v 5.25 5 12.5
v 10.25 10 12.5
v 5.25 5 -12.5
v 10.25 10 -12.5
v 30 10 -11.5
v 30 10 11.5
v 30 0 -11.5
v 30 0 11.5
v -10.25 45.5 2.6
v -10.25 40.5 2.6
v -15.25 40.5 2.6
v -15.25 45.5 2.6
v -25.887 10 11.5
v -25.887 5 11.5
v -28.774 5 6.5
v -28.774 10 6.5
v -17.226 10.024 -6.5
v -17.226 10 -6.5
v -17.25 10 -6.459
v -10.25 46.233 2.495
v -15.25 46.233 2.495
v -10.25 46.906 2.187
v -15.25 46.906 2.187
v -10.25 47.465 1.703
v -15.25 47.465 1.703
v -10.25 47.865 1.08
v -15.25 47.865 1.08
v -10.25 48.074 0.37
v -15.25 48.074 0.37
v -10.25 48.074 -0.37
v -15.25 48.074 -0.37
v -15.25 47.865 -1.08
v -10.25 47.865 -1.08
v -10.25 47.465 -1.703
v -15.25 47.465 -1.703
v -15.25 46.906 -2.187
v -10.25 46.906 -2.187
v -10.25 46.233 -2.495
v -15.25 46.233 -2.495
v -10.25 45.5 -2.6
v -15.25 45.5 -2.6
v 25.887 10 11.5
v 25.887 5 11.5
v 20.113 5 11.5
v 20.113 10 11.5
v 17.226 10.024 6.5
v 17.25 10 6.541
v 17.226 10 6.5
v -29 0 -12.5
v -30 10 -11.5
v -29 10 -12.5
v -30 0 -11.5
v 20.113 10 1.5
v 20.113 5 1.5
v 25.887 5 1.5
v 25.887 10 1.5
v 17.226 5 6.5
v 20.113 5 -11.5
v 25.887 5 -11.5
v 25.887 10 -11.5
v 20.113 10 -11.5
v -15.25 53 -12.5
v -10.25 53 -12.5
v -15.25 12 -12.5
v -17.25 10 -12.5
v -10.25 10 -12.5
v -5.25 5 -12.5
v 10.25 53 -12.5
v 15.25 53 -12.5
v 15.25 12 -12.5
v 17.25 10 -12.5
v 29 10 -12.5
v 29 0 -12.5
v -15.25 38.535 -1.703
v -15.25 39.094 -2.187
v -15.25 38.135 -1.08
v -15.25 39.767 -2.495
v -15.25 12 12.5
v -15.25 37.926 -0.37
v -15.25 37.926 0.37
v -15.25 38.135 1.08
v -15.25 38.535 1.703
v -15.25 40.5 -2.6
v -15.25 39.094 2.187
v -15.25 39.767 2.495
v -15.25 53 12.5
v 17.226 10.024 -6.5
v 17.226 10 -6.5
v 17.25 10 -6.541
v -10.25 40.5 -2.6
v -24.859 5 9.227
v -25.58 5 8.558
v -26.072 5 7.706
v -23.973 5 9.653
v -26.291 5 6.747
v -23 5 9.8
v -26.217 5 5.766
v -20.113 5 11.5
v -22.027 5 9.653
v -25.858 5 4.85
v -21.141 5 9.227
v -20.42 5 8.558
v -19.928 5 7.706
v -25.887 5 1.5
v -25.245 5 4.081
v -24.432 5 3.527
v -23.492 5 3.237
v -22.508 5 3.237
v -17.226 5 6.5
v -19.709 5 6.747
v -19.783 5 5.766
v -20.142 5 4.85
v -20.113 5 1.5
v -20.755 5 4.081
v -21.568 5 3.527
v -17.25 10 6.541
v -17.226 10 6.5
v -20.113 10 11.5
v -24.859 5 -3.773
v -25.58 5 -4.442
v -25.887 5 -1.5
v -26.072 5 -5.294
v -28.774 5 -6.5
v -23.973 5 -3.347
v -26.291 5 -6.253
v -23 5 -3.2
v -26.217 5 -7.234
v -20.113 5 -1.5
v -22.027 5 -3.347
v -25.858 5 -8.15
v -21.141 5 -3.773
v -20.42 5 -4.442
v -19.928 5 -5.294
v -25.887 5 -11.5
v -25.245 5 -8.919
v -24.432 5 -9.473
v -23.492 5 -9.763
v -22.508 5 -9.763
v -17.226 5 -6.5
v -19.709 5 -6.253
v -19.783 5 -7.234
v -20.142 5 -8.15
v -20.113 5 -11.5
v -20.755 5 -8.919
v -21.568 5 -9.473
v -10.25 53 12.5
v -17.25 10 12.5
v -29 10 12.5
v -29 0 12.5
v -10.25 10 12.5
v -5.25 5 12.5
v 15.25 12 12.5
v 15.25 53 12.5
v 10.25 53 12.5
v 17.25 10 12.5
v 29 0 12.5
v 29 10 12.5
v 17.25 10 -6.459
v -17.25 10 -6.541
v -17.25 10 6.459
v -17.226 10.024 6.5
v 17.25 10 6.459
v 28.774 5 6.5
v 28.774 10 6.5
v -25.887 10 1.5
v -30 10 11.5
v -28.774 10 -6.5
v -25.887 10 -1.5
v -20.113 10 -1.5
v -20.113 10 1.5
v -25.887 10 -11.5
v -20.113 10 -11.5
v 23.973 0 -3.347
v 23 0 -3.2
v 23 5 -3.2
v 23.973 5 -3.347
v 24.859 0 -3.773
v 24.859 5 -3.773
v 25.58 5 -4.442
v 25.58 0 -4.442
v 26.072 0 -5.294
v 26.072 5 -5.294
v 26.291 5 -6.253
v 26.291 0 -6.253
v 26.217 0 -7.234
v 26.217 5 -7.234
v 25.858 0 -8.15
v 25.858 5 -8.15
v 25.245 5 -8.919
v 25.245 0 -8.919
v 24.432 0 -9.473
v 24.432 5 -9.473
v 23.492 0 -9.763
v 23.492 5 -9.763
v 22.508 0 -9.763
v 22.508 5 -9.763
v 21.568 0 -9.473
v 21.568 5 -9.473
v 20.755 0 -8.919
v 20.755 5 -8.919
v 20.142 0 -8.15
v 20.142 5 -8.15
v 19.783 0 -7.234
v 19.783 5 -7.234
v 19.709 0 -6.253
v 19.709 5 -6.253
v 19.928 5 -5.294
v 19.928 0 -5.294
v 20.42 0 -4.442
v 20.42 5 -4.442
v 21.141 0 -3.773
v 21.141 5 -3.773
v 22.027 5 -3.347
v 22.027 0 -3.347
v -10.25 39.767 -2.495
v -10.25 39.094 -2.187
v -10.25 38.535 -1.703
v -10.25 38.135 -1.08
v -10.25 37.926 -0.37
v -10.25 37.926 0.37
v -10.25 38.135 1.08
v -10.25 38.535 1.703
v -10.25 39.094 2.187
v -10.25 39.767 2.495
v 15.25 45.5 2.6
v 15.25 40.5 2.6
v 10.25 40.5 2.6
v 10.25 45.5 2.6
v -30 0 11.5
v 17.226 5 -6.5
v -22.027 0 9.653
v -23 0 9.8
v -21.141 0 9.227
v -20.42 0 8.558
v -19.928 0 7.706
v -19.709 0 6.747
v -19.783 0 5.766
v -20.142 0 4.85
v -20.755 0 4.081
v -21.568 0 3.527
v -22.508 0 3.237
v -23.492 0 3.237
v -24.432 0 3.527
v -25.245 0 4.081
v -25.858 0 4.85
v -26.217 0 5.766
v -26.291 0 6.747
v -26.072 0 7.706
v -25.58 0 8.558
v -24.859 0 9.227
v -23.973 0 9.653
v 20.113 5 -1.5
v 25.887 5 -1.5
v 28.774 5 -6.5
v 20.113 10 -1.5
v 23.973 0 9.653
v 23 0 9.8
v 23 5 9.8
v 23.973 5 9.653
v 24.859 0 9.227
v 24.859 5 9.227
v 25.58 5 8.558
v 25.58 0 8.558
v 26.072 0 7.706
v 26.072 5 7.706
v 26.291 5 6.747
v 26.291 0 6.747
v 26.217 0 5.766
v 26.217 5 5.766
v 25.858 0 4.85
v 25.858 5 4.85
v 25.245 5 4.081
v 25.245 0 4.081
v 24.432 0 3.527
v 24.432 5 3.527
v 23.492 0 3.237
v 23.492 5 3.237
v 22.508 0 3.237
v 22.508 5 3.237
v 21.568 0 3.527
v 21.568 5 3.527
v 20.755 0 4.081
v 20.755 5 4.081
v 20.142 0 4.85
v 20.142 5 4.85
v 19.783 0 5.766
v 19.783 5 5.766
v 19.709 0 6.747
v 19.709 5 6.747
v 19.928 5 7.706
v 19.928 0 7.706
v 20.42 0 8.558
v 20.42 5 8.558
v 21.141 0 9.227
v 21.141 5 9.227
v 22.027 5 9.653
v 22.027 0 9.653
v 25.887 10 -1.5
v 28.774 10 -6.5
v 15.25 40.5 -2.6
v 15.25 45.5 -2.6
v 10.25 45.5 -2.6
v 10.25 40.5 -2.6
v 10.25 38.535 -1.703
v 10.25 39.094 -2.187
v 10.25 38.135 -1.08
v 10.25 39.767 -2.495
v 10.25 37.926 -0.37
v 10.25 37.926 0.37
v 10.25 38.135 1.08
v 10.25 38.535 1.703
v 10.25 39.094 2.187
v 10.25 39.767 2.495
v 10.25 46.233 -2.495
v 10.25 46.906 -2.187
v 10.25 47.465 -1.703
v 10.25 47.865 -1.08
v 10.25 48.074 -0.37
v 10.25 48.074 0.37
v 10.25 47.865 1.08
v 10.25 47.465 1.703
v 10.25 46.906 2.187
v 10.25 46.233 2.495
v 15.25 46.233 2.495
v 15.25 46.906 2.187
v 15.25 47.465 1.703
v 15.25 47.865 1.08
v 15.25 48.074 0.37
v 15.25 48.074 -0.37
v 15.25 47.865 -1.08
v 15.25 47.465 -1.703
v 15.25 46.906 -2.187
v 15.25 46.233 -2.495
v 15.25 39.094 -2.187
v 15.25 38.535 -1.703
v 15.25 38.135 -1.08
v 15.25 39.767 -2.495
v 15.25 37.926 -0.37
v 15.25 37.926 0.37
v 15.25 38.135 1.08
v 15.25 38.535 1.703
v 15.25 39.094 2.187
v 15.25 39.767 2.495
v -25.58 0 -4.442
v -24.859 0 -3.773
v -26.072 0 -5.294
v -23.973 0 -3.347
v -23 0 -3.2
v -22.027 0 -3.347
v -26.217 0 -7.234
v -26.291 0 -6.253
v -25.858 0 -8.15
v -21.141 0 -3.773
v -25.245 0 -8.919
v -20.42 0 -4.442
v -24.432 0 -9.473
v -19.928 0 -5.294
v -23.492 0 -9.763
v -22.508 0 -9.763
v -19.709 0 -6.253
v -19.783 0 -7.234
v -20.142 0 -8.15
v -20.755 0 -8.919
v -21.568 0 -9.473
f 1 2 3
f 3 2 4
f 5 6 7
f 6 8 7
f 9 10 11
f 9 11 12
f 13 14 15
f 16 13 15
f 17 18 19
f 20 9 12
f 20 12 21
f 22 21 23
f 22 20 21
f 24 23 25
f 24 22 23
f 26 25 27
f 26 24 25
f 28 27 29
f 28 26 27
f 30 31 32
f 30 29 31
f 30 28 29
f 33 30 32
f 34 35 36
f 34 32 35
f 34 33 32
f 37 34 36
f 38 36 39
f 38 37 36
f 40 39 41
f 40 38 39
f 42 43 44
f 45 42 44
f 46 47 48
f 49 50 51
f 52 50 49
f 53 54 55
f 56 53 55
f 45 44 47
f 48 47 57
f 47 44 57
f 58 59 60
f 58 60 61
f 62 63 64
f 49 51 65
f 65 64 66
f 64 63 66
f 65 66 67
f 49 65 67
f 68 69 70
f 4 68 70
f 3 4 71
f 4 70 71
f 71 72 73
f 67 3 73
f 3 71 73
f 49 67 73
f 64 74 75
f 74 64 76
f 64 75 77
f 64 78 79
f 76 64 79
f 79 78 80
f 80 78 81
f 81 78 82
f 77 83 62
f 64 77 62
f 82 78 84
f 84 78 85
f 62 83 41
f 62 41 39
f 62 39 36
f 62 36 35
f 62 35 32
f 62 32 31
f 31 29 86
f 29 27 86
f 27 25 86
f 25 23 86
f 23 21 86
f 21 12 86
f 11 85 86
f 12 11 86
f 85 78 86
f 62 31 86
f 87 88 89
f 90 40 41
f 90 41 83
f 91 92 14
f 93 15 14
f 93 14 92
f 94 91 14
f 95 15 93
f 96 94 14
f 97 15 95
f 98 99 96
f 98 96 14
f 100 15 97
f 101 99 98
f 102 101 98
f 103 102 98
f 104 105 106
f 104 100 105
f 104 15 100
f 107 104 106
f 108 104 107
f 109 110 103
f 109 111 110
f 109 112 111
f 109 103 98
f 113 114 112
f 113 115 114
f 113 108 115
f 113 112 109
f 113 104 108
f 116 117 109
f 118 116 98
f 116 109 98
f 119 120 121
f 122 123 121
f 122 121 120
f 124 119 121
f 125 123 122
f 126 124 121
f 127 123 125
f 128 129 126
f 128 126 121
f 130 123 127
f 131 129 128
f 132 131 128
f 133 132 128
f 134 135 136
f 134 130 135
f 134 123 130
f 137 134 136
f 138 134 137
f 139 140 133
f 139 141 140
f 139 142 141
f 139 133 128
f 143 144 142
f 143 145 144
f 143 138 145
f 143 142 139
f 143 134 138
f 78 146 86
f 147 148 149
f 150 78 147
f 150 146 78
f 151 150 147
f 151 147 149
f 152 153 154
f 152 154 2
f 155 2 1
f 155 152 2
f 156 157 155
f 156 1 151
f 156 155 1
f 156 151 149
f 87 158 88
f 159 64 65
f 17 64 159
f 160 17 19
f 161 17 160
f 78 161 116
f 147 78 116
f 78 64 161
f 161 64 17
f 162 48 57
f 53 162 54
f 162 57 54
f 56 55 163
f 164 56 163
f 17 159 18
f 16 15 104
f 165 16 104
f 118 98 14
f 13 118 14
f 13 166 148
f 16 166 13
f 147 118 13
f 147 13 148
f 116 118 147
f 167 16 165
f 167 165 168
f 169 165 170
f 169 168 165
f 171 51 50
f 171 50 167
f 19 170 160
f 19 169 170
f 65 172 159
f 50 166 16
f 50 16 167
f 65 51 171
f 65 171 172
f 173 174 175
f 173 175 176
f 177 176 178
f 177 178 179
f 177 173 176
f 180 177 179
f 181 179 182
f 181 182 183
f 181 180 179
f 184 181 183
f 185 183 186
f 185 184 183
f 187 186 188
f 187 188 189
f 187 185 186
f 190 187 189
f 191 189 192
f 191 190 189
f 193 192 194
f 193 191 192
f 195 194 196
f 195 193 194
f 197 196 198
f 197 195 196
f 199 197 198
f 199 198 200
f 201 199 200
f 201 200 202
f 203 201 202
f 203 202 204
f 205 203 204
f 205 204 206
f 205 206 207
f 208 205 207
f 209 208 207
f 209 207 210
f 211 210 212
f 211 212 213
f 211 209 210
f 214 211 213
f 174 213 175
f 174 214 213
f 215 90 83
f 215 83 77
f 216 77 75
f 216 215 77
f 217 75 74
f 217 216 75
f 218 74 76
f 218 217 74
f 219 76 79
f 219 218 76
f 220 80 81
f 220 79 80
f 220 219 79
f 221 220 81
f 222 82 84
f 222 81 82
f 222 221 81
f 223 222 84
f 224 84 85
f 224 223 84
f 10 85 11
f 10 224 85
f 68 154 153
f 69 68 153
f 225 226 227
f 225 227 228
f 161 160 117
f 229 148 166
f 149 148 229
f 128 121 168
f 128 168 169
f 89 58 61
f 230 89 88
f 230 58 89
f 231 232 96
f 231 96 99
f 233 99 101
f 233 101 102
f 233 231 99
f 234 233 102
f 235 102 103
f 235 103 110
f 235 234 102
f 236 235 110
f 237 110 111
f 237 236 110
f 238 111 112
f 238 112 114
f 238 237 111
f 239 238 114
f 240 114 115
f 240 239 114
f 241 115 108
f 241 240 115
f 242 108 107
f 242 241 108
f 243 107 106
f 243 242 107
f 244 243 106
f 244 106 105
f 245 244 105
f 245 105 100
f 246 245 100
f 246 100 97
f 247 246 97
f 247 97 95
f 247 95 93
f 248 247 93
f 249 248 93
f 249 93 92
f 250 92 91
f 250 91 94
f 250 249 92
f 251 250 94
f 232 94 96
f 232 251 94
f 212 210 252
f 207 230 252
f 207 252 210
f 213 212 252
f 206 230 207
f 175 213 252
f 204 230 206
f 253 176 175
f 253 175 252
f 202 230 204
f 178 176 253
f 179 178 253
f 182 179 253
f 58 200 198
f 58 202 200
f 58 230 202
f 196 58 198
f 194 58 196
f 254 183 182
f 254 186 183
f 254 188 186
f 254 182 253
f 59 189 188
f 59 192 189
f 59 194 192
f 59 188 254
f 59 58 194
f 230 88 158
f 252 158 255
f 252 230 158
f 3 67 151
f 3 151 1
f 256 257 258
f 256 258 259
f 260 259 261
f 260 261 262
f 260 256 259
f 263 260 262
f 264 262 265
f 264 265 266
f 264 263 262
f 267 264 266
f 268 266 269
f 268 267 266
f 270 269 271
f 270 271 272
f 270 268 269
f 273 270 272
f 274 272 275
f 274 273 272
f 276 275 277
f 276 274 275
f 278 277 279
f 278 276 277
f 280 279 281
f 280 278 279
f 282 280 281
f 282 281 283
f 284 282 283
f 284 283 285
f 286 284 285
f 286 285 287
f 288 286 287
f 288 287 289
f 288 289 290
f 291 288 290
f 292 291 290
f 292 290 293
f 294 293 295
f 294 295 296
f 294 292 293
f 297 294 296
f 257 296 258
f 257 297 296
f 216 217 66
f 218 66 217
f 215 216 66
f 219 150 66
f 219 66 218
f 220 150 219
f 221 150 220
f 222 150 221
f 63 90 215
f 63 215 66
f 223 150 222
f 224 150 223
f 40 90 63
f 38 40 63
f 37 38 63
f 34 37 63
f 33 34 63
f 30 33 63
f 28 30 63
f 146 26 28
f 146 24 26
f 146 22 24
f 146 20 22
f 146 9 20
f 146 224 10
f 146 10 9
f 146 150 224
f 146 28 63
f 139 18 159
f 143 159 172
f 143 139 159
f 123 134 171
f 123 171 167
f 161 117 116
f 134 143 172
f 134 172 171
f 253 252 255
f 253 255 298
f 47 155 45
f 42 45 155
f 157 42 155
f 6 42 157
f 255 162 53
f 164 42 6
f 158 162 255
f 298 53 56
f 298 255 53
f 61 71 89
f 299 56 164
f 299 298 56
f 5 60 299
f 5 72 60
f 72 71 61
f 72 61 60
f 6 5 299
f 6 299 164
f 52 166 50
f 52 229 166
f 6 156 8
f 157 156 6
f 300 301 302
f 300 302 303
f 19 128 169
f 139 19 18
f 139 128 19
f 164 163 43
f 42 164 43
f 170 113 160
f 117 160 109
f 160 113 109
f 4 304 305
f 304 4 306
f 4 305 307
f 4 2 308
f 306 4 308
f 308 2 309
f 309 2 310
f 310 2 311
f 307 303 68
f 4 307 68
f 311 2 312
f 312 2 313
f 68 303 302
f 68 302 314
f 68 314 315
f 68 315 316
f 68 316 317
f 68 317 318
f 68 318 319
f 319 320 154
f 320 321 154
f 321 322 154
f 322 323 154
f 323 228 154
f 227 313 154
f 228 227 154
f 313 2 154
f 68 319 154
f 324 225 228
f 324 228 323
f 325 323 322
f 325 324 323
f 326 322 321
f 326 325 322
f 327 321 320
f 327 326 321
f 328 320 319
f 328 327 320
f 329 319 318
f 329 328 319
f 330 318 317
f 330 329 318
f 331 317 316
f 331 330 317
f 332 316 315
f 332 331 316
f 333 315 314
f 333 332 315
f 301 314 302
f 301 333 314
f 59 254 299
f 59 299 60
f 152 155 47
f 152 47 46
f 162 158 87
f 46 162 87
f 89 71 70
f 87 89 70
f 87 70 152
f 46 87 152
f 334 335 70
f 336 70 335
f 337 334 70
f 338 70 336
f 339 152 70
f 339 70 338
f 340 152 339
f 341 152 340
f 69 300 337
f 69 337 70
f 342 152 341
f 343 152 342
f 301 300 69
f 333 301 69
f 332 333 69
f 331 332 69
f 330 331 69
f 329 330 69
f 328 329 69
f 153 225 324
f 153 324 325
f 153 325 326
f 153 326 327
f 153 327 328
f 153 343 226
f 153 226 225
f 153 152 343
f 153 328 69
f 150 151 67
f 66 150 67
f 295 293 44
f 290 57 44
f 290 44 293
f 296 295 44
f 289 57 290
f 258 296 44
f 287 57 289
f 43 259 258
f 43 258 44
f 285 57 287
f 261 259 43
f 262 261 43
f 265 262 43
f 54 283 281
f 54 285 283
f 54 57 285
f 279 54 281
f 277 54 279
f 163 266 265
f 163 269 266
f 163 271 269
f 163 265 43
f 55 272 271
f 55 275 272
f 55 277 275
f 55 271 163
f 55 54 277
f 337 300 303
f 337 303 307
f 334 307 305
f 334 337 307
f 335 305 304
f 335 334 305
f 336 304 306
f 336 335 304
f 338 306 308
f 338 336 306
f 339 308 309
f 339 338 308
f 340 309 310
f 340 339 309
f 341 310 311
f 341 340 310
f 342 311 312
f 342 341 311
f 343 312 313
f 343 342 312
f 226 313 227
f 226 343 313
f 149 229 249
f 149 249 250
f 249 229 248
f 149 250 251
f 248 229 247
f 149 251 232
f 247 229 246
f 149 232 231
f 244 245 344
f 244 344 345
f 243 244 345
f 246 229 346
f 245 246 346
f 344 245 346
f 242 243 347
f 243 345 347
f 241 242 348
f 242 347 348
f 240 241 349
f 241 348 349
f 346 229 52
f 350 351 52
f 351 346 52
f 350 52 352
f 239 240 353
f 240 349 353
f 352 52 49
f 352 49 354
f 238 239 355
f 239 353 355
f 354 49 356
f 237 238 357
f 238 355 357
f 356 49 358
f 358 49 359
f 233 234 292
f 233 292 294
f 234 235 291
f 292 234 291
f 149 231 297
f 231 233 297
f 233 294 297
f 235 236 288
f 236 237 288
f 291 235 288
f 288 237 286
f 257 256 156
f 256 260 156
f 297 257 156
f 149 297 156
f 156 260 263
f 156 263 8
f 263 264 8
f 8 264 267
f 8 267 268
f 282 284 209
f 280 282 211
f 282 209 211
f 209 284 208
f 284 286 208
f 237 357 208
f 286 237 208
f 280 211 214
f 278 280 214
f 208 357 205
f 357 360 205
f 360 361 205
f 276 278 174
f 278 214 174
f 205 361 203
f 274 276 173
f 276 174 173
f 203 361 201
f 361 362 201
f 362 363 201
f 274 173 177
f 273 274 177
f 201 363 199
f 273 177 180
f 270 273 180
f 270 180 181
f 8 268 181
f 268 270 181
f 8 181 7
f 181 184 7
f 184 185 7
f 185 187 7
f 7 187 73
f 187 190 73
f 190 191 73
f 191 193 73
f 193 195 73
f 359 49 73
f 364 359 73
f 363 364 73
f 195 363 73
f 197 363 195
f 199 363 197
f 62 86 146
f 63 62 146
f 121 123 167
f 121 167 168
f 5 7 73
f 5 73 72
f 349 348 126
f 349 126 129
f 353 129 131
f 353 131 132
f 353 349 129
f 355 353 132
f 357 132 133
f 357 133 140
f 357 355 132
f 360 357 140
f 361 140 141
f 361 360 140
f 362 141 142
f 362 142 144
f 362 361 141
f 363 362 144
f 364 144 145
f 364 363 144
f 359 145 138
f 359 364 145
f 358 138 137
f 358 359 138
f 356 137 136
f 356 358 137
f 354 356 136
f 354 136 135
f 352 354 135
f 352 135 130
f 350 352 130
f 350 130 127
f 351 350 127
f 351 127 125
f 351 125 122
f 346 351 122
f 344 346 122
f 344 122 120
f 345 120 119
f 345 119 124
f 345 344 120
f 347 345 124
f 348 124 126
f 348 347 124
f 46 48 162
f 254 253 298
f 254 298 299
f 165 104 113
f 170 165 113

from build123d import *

# Parameters (mm, degrees)
SKETCH2_W           = 60
SKETCH2_H           = 25
SKETCH2_R           = 3.3
BOSS_EXTRUDE2_DEPTH = 5
SKETCH3_W           = 5
SKETCH3_H           = 48
BOSS_EXTRUDE3_DEPTH = 25
CUT_EXTRUDE1_REACH  = 72.801
SKETCH5_W           = 14.75
SKETCH5_H           = 25
BOSS_EXTRUDE4_DEPTH = 5
CHAMFER1_SIZE       = 2
CHAMFER2_SIZE       = 5
CHAMFER3_SIZE       = 1


with BuildPart() as part:
    # Sketch2 → Boss-Extrude2 (new body)
    with BuildSketch(Plane(origin=(0, 0, 0), x_dir=(1, 0, 0), z_dir=(0, 1, 0))):
        Rectangle(SKETCH2_W, SKETCH2_H)
        with Locations(Location((-23, 6.5, 0), (0, 0, 270))):
            Circle(SKETCH2_R, mode=Mode.SUBTRACT)
        with Locations(Location((23, 6.5, 0), (0, 0, 270))):
            Circle(SKETCH2_R, mode=Mode.SUBTRACT)
        with Locations(Location((-23, -6.5, 0), (0, 0, 270))):
            Circle(SKETCH2_R, mode=Mode.SUBTRACT)
        with Locations(Location((23, -6.5, 0), (0, 0, 270))):
            Circle(SKETCH2_R, mode=Mode.SUBTRACT)
    extrude(amount=BOSS_EXTRUDE2_DEPTH)

    # Sketch3 → Boss-Extrude3 (add)
    with BuildSketch(Plane.XY.offset(12.5)):
        with Locations((-12.75, 29)):
            Rectangle(SKETCH3_W, SKETCH3_H)
        with Locations((12.75, 29)):
            Rectangle(SKETCH3_W, SKETCH3_H)
    extrude(amount=-BOSS_EXTRUDE3_DEPTH)

    # Cut-Extrude1: up to this face of the body (flat: up to its plane)
    cut_extrude1_end = Plane(part.part.faces().sort_by_distance((-15.25, 29, 0))[0])
    # Sketch4 → Cut-Extrude1 (cut, up to the picked face)
    with BuildSketch(Plane(origin=(15.25, 0, 0), x_dir=(0, 0, -1), z_dir=(1, 0, 0)), mode=Mode.PRIVATE) as cut_extrude1_sk1:
        with BuildLine():
            Line((2.6, 45.5), (2.6, 40.5))
            ThreePointArc((2.6, 40.5), (0, 37.9), (-2.6, 40.5))
            Line((-2.6, 40.5), (-2.6, 45.5))
            ThreePointArc((-2.6, 45.5), (0, 48.1), (2.6, 45.5))
        make_face()
    cut_extrude1_tool1 = split(extrude(cut_extrude1_sk1.sketch, amount=-CUT_EXTRUDE1_REACH, mode=Mode.PRIVATE), bisect_by=cut_extrude1_end, keep=Keep.BOTH, mode=Mode.PRIVATE)
    add(cut_extrude1_tool1.solids().sort_by(Axis((15.25, 43, 0), (-1, 0, 0)))[0], mode=Mode.SUBTRACT)

    # Sketch5 → Boss-Extrude4 (add)
    # profile 1 of 2: a face of its own
    with BuildSketch(Plane(origin=(0, 5, 0), x_dir=(1, 0, 0), z_dir=(0, 1, 0))):
        with Locations((22.625, 0)):
            Rectangle(SKETCH5_W, SKETCH5_H)
        Polygon((28.773502692, 6.5), (25.886751346, 11.5), (20.113248654, 11.5), (17.226497308, 6.5), (20.113248654, 1.5), (25.886751346, 1.5), align=None, mode=Mode.SUBTRACT)
        Polygon((25.886751346, -1.5), (28.773502692, -6.5), (25.886751346, -11.5), (20.113248654, -11.5), (17.226497308, -6.5), (20.113248654, -1.5), align=None, mode=Mode.SUBTRACT)
    # profile 2 of 2: a face of its own
    with BuildSketch(Plane(origin=(0, 5, 0), x_dir=(1, 0, 0), z_dir=(0, 1, 0))):
        with Locations((-22.625, 0)):
            Rectangle(SKETCH5_W, SKETCH5_H)
        Polygon((-17.226497308, 6.5), (-20.113248654, 11.5), (-25.886751346, 11.5), (-28.773502692, 6.5), (-25.886751346, 1.5), (-20.113248654, 1.5), align=None, mode=Mode.SUBTRACT)
        Polygon((-20.113248654, -1.5), (-17.226497308, -6.5), (-20.113248654, -11.5), (-25.886751346, -11.5), (-28.773502692, -6.5), (-25.886751346, -1.5), align=None, mode=Mode.SUBTRACT)
    extrude(amount=BOSS_EXTRUDE4_DEPTH)

    # Chamfer1
    # the kernel refuses this chamfer: 2 mm, written as the material it adds along each edge
    with BuildSketch(Plane(origin=(15.25, 10, -12.5), x_dir=(0.9996219169112968, -0.02749587661058651, 0), z_dir=(0, 0, 1))) as chamfer1_piece_1_section:
        Polygon((CHAMFER1_SIZE * 0.999621916911, CHAMFER1_SIZE * 0.0274958766106), (-CHAMFER1_SIZE * 0.0274958766106, CHAMFER1_SIZE * 0.999621916911), (0, 0), align=None)
    chamfer1_piece_1 = extrude(amount=25, mode=Mode.PRIVATE)
    chamfer1_piece_1 = split(chamfer1_piece_1, bisect_by=Plane(origin=(15.178146825, 10.596401608, -10.047847108), z_dir=(0.8660254037844565, 0, -0.4999999999999692)), keep=Keep.TOP, mode=Mode.PRIVATE)
    chamfer1_piece_1 = split(chamfer1_piece_1, bisect_by=Plane(origin=(18.675487588, 10.596401608, -9.009724784), z_dir=(-0.8660254037844565, 0, -0.49999999999996914)), keep=Keep.TOP, mode=Mode.PRIVATE)
    add(chamfer1_piece_1)
    with BuildSketch(Plane(origin=(15.25, 10, -12.5), x_dir=(0.9996219169112968, -0.02749587661058651, 0), z_dir=(0, 0, 1))) as chamfer1_piece_2_section:
        Polygon((CHAMFER1_SIZE * 0.999621916911, CHAMFER1_SIZE * 0.0274958766106), (-CHAMFER1_SIZE * 0.0274958766106, CHAMFER1_SIZE * 0.999621916911), (0, 0), align=None)
    chamfer1_piece_2 = extrude(amount=25, mode=Mode.PRIVATE)
    chamfer1_piece_2 = split(chamfer1_piece_2, bisect_by=Plane(origin=(16.849076721, 10.762644927, -7.153711633), z_dir=(-0.8660254037844565, 0, 0.4999999999999692)), keep=Keep.TOP, mode=Mode.PRIVATE)
    chamfer1_piece_2 = split(chamfer1_piece_2, bisect_by=Plane(origin=(16.849076721, 10.762644927, -5.846288367), z_dir=(-0.8660254037844565, 0, -0.49999999999996914)), keep=Keep.TOP, mode=Mode.PRIVATE)
    add(chamfer1_piece_2)
    with BuildSketch(Plane(origin=(15.25, 10, -12.5), x_dir=(0.9996219169112968, -0.02749587661058651, 0), z_dir=(0, 0, 1))) as chamfer1_piece_3_section:
        Polygon((CHAMFER1_SIZE * 0.999621916911, CHAMFER1_SIZE * 0.0274958766106), (-CHAMFER1_SIZE * 0.0274958766106, CHAMFER1_SIZE * 0.999621916911), (0, 0), align=None)
    chamfer1_piece_3 = extrude(amount=25, mode=Mode.PRIVATE)
    chamfer1_piece_3 = split(chamfer1_piece_3, bisect_by=Plane(origin=(14.108732703, 10.603890332, 1.099873298), z_dir=(0.8660254037844565, 0, -0.49999999999996914)), keep=Keep.TOP, mode=Mode.PRIVATE)
    chamfer1_piece_3 = split(chamfer1_piece_3, bisect_by=Plane(origin=(19.737897828, 10.603890332, 2.150126702), z_dir=(-0.8660254037844565, 0, -0.4999999999999692)), keep=Keep.TOP, mode=Mode.PRIVATE)
    chamfer1_piece_3 = split(chamfer1_piece_3, bisect_by=Plane(origin=(19.737897828, 10.603890332, -2.150126702), z_dir=(-0.8660254037844565, 0, 0.4999999999999692)), keep=Keep.TOP, mode=Mode.PRIVATE)
    chamfer1_piece_3 = split(chamfer1_piece_3, bisect_by=Plane(origin=(14.108732703, 10.603890332, -1.099873298), z_dir=(0.8660254037844565, 0, 0.49999999999996914)), keep=Keep.TOP, mode=Mode.PRIVATE)
    add(chamfer1_piece_3)
    with BuildSketch(Plane(origin=(15.25, 10, -12.5), x_dir=(0.9996219169112968, -0.02749587661058651, 0), z_dir=(0, 0, 1))) as chamfer1_piece_4_section:
        Polygon((CHAMFER1_SIZE * 0.999621916911, CHAMFER1_SIZE * 0.0274958766106), (-CHAMFER1_SIZE * 0.0274958766106, CHAMFER1_SIZE * 0.999621916911), (0, 0), align=None)
    chamfer1_piece_4 = extrude(amount=25, mode=Mode.PRIVATE)
    chamfer1_piece_4 = split(chamfer1_piece_4, bisect_by=Plane(origin=(16.849076721, 10.762644927, 5.846288367), z_dir=(-0.8660254037844565, 0, 0.49999999999996914)), keep=Keep.TOP, mode=Mode.PRIVATE)
    chamfer1_piece_4 = split(chamfer1_piece_4, bisect_by=Plane(origin=(16.849076721, 10.762644927, 7.153711633), z_dir=(-0.8660254037844565, 0, -0.4999999999999692)), keep=Keep.TOP, mode=Mode.PRIVATE)
    add(chamfer1_piece_4)
    with BuildSketch(Plane(origin=(15.25, 10, -12.5), x_dir=(0.9996219169112968, -0.02749587661058651, 0), z_dir=(0, 0, 1))) as chamfer1_piece_5_section:
        Polygon((CHAMFER1_SIZE * 0.999621916911, CHAMFER1_SIZE * 0.0274958766106), (-CHAMFER1_SIZE * 0.0274958766106, CHAMFER1_SIZE * 0.999621916911), (0, 0), align=None)
    chamfer1_piece_5 = extrude(amount=25, mode=Mode.PRIVATE)
    chamfer1_piece_5 = split(chamfer1_piece_5, bisect_by=Plane(origin=(18.675487588, 10.596401608, 9.009724784), z_dir=(-0.8660254037844565, 0, 0.49999999999996914)), keep=Keep.TOP, mode=Mode.PRIVATE)
    chamfer1_piece_5 = split(chamfer1_piece_5, bisect_by=Plane(origin=(15.178146825, 10.596401608, 10.047847108), z_dir=(0.8660254037844565, 0, 0.4999999999999692)), keep=Keep.TOP, mode=Mode.PRIVATE)
    add(chamfer1_piece_5)
    with BuildSketch(Plane(origin=(-15.25, 10, 12.5), x_dir=(0.027495876610586487, 0.9996219169112968, 0), z_dir=(0, 0, -1))) as chamfer1_piece_6_section:
        Polygon((CHAMFER1_SIZE * 0.999621916911, -CHAMFER1_SIZE * 0.0274958766106), (-CHAMFER1_SIZE * 0.0274958766106, -CHAMFER1_SIZE * 0.999621916911), (0, 0), align=None)
    chamfer1_piece_6 = extrude(amount=25, mode=Mode.PRIVATE)
    chamfer1_piece_6 = split(chamfer1_piece_6, bisect_by=Plane(origin=(-15.178146825, 10.596401608, 10.047847108), z_dir=(-0.866025403784439, 0, 0.4999999999999995)), keep=Keep.TOP, mode=Mode.PRIVATE)
    chamfer1_piece_6 = split(chamfer1_piece_6, bisect_by=Plane(origin=(-18.675487588, 10.596401608, 9.009724784), z_dir=(0.8660254037844384, 0, 0.5000000000000004)), keep=Keep.TOP, mode=Mode.PRIVATE)
    add(chamfer1_piece_6)
    with BuildSketch(Plane(origin=(-15.25, 10, 12.5), x_dir=(0.027495876610586487, 0.9996219169112968, 0), z_dir=(0, 0, -1))) as chamfer1_piece_7_section:
        Polygon((CHAMFER1_SIZE * 0.999621916911, -CHAMFER1_SIZE * 0.0274958766106), (-CHAMFER1_SIZE * 0.0274958766106, -CHAMFER1_SIZE * 0.999621916911), (0, 0), align=None)
    chamfer1_piece_7 = extrude(amount=25, mode=Mode.PRIVATE)
    chamfer1_piece_7 = split(chamfer1_piece_7, bisect_by=Plane(origin=(-16.849076721, 10.762644927, 7.153711633), z_dir=(0.866025403784439, 0, -0.4999999999999995)), keep=Keep.TOP, mode=Mode.PRIVATE)
    chamfer1_piece_7 = split(chamfer1_piece_7, bisect_by=Plane(origin=(-16.849076721, 10.762644927, 5.846288367), z_dir=(0.8660254037844384, 0, 0.5000000000000004)), keep=Keep.TOP, mode=Mode.PRIVATE)
    add(chamfer1_piece_7)
    with BuildSketch(Plane(origin=(-15.25, 10, 12.5), x_dir=(0.027495876610586487, 0.9996219169112968, 0), z_dir=(0, 0, -1))) as chamfer1_piece_8_section:
        Polygon((CHAMFER1_SIZE * 0.999621916911, -CHAMFER1_SIZE * 0.0274958766106), (-CHAMFER1_SIZE * 0.0274958766106, -CHAMFER1_SIZE * 0.999621916911), (0, 0), align=None)
    chamfer1_piece_8 = extrude(amount=25, mode=Mode.PRIVATE)
    chamfer1_piece_8 = split(chamfer1_piece_8, bisect_by=Plane(origin=(-19.737897828, 10.603890332, 2.150126702), z_dir=(0.866025403784439, 0, -0.4999999999999995)), keep=Keep.TOP, mode=Mode.PRIVATE)
    chamfer1_piece_8 = split(chamfer1_piece_8, bisect_by=Plane(origin=(-14.108732703, 10.603890332, 1.099873298), z_dir=(-0.8660254037844384, 0, -0.5000000000000004)), keep=Keep.TOP, mode=Mode.PRIVATE)
    chamfer1_piece_8 = split(chamfer1_piece_8, bisect_by=Plane(origin=(-14.108732703, 10.603890332, -1.099873298), z_dir=(-0.8660254037844384, 0, 0.5000000000000006)), keep=Keep.TOP, mode=Mode.PRIVATE)
    chamfer1_piece_8 = split(chamfer1_piece_8, bisect_by=Plane(origin=(-19.737897828, 10.603890332, -2.150126702), z_dir=(0.866025403784439, 0, 0.4999999999999995)), keep=Keep.TOP, mode=Mode.PRIVATE)
    add(chamfer1_piece_8)
    with BuildSketch(Plane(origin=(-15.25, 10, 12.5), x_dir=(0.027495876610586487, 0.9996219169112968, 0), z_dir=(0, 0, -1))) as chamfer1_piece_9_section:
        Polygon((CHAMFER1_SIZE * 0.999621916911, -CHAMFER1_SIZE * 0.0274958766106), (-CHAMFER1_SIZE * 0.0274958766106, -CHAMFER1_SIZE * 0.999621916911), (0, 0), align=None)
    chamfer1_piece_9 = extrude(amount=25, mode=Mode.PRIVATE)
    chamfer1_piece_9 = split(chamfer1_piece_9, bisect_by=Plane(origin=(-16.849076721, 10.762644927, -5.846288367), z_dir=(0.8660254037844384, 0, -0.5000000000000006)), keep=Keep.TOP, mode=Mode.PRIVATE)
    chamfer1_piece_9 = split(chamfer1_piece_9, bisect_by=Plane(origin=(-16.849076721, 10.762644927, -7.153711633), z_dir=(0.866025403784439, 0, 0.4999999999999995)), keep=Keep.TOP, mode=Mode.PRIVATE)
    add(chamfer1_piece_9)
    with BuildSketch(Plane(origin=(-15.25, 10, 12.5), x_dir=(0.027495876610586487, 0.9996219169112968, 0), z_dir=(0, 0, -1))) as chamfer1_piece_10_section:
        Polygon((CHAMFER1_SIZE * 0.999621916911, -CHAMFER1_SIZE * 0.0274958766106), (-CHAMFER1_SIZE * 0.0274958766106, -CHAMFER1_SIZE * 0.999621916911), (0, 0), align=None)
    chamfer1_piece_10 = extrude(amount=25, mode=Mode.PRIVATE)
    chamfer1_piece_10 = split(chamfer1_piece_10, bisect_by=Plane(origin=(-18.675487588, 10.596401608, -9.009724784), z_dir=(0.8660254037844384, 0, -0.5000000000000006)), keep=Keep.TOP, mode=Mode.PRIVATE)
    chamfer1_piece_10 = split(chamfer1_piece_10, bisect_by=Plane(origin=(-15.178146825, 10.596401608, -10.047847108), z_dir=(-0.866025403784439, 0, -0.4999999999999995)), keep=Keep.TOP, mode=Mode.PRIVATE)
    add(chamfer1_piece_10)

    # Chamfer2
    chamfer2_edges = [part.edges().sort_by_distance(p)[0] for p in [
        (-10.25, 5, 0),
        (10.25, 5, 0),
    ]]
    chamfer(chamfer2_edges, length=CHAMFER2_SIZE)

    # Chamfer3
    chamfer3_edges = [part.edges().sort_by_distance(p)[0] for p in [
        (30, 5, 12.5),
        (-30, 5, 12.5),
        (-30, 5, -12.5),
        (30, 5, -12.5),
    ]]
    chamfer(chamfer3_edges, length=CHAMFER3_SIZE)


solid = part.part
